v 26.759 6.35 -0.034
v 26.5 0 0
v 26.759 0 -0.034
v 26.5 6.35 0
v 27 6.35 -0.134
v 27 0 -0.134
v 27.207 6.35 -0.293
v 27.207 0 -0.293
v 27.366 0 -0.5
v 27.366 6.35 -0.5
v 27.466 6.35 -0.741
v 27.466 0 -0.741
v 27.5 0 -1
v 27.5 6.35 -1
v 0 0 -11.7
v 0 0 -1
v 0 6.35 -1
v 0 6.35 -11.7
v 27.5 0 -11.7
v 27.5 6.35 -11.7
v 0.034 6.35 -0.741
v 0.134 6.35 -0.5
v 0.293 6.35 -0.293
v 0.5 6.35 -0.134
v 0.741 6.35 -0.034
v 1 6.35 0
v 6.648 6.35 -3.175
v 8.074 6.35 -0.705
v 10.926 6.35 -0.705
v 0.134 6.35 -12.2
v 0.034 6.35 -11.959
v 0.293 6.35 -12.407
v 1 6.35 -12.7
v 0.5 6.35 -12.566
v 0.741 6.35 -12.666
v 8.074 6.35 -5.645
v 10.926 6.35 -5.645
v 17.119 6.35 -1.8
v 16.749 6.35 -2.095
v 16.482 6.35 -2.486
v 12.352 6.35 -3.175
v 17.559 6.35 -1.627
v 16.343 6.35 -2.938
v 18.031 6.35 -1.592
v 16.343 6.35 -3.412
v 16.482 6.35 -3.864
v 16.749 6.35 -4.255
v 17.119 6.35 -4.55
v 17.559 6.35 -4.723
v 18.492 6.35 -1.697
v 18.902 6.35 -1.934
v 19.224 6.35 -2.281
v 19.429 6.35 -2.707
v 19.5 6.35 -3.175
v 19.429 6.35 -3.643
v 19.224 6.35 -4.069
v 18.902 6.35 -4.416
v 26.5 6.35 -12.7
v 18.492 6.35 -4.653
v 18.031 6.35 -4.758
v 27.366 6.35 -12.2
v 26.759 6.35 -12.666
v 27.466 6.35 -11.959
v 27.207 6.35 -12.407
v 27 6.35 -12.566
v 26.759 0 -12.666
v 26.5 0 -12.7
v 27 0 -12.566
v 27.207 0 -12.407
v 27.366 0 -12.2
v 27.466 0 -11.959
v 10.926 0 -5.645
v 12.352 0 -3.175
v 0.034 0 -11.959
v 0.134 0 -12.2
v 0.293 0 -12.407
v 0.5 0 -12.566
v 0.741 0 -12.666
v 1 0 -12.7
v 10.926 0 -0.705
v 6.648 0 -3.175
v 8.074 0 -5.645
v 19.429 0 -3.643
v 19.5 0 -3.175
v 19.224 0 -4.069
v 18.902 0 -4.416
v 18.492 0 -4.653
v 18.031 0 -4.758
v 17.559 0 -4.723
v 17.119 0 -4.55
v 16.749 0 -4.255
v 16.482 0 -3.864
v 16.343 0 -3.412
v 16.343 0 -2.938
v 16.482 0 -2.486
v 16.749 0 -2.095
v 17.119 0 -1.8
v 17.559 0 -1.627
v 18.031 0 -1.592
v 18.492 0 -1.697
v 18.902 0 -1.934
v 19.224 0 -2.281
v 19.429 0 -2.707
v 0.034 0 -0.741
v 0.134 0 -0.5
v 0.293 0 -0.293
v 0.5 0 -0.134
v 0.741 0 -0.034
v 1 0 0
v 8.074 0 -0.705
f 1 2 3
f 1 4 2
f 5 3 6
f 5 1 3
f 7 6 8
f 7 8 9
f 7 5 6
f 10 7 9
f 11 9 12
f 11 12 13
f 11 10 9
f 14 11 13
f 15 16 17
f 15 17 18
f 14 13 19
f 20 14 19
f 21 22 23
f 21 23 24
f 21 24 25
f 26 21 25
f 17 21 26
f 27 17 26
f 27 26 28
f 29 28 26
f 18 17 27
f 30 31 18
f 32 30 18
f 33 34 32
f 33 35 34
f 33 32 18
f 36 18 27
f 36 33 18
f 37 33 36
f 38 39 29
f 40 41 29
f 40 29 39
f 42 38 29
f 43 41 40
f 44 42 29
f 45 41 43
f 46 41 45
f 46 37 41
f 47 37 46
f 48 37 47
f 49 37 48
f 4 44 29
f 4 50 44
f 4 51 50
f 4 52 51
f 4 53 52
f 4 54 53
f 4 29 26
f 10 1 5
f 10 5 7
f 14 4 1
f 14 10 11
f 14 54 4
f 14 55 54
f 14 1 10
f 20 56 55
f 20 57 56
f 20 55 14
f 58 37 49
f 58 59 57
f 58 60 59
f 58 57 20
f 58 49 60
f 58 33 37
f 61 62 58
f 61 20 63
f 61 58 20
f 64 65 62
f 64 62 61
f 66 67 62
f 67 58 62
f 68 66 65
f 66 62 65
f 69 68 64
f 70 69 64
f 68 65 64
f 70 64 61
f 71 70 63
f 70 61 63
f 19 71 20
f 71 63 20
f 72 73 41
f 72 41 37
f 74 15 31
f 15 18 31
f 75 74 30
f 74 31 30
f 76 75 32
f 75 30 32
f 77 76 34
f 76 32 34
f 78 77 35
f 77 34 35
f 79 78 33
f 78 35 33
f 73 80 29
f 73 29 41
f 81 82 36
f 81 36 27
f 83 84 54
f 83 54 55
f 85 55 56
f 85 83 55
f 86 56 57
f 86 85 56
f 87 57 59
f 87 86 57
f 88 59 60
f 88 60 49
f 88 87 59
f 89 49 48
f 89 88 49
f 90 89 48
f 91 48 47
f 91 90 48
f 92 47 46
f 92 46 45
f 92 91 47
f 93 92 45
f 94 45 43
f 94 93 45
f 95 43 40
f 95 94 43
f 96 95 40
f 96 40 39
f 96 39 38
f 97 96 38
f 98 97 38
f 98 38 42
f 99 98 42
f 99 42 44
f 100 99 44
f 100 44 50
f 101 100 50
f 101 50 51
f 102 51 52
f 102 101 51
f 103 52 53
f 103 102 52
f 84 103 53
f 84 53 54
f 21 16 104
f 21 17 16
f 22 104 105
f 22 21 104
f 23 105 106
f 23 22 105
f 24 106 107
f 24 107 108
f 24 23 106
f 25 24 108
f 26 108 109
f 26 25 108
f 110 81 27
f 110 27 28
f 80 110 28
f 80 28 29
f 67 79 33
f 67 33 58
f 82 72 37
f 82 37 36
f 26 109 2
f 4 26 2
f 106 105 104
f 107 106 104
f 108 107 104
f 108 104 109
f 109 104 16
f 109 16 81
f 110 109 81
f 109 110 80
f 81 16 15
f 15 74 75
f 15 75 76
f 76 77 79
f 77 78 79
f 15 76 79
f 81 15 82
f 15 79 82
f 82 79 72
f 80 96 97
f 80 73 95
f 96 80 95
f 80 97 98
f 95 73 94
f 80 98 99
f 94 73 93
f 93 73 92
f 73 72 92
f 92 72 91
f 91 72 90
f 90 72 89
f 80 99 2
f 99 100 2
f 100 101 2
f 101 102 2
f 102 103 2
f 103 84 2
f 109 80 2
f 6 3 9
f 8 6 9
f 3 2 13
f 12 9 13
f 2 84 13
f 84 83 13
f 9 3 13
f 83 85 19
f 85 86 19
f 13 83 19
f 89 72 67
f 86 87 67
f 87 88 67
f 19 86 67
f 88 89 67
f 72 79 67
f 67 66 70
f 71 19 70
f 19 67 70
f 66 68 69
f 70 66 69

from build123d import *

# Parameters (mm, degrees)
SKETCH1_W           = 27.5
SKETCH1_H           = 12.7
SKETCH1_R           = 1.5875
BOSS_EXTRUDE1_DEPTH = 6.35
FILLET1_R           = 1


with BuildPart() as part:
    # Sketch1 → Boss-Extrude1 (new body)
    with BuildSketch(Plane(origin=(0, 0, 0), x_dir=(1, 0, 0), z_dir=(0, 1, 0))):
        with Locations((13.75, 6.35)):
            Rectangle(SKETCH1_W, SKETCH1_H)
        with Locations((17.9125, 3.175)):
            Circle(SKETCH1_R, mode=Mode.SUBTRACT)
        Polygon((12.352283535, 3.175), (10.926141767, 5.64515), (8.073858233, 5.64515), (6.647716465, 3.175), (8.073858233, 0.70485), (10.926141767, 0.70485), align=None, mode=Mode.SUBTRACT)
    extrude(amount=BOSS_EXTRUDE1_DEPTH)

    # Fillet1
    fillet1_edges = [part.edges().sort_by_distance(p)[0] for p in [
        (0, 3.175, -12.7),
        (27.5, 3.175, -12.7),
        (27.5, 3.175, 0),
        (0, 3.175, 0),
    ]]
    fillet(fillet1_edges, radius=FILLET1_R)


solid = part.part
